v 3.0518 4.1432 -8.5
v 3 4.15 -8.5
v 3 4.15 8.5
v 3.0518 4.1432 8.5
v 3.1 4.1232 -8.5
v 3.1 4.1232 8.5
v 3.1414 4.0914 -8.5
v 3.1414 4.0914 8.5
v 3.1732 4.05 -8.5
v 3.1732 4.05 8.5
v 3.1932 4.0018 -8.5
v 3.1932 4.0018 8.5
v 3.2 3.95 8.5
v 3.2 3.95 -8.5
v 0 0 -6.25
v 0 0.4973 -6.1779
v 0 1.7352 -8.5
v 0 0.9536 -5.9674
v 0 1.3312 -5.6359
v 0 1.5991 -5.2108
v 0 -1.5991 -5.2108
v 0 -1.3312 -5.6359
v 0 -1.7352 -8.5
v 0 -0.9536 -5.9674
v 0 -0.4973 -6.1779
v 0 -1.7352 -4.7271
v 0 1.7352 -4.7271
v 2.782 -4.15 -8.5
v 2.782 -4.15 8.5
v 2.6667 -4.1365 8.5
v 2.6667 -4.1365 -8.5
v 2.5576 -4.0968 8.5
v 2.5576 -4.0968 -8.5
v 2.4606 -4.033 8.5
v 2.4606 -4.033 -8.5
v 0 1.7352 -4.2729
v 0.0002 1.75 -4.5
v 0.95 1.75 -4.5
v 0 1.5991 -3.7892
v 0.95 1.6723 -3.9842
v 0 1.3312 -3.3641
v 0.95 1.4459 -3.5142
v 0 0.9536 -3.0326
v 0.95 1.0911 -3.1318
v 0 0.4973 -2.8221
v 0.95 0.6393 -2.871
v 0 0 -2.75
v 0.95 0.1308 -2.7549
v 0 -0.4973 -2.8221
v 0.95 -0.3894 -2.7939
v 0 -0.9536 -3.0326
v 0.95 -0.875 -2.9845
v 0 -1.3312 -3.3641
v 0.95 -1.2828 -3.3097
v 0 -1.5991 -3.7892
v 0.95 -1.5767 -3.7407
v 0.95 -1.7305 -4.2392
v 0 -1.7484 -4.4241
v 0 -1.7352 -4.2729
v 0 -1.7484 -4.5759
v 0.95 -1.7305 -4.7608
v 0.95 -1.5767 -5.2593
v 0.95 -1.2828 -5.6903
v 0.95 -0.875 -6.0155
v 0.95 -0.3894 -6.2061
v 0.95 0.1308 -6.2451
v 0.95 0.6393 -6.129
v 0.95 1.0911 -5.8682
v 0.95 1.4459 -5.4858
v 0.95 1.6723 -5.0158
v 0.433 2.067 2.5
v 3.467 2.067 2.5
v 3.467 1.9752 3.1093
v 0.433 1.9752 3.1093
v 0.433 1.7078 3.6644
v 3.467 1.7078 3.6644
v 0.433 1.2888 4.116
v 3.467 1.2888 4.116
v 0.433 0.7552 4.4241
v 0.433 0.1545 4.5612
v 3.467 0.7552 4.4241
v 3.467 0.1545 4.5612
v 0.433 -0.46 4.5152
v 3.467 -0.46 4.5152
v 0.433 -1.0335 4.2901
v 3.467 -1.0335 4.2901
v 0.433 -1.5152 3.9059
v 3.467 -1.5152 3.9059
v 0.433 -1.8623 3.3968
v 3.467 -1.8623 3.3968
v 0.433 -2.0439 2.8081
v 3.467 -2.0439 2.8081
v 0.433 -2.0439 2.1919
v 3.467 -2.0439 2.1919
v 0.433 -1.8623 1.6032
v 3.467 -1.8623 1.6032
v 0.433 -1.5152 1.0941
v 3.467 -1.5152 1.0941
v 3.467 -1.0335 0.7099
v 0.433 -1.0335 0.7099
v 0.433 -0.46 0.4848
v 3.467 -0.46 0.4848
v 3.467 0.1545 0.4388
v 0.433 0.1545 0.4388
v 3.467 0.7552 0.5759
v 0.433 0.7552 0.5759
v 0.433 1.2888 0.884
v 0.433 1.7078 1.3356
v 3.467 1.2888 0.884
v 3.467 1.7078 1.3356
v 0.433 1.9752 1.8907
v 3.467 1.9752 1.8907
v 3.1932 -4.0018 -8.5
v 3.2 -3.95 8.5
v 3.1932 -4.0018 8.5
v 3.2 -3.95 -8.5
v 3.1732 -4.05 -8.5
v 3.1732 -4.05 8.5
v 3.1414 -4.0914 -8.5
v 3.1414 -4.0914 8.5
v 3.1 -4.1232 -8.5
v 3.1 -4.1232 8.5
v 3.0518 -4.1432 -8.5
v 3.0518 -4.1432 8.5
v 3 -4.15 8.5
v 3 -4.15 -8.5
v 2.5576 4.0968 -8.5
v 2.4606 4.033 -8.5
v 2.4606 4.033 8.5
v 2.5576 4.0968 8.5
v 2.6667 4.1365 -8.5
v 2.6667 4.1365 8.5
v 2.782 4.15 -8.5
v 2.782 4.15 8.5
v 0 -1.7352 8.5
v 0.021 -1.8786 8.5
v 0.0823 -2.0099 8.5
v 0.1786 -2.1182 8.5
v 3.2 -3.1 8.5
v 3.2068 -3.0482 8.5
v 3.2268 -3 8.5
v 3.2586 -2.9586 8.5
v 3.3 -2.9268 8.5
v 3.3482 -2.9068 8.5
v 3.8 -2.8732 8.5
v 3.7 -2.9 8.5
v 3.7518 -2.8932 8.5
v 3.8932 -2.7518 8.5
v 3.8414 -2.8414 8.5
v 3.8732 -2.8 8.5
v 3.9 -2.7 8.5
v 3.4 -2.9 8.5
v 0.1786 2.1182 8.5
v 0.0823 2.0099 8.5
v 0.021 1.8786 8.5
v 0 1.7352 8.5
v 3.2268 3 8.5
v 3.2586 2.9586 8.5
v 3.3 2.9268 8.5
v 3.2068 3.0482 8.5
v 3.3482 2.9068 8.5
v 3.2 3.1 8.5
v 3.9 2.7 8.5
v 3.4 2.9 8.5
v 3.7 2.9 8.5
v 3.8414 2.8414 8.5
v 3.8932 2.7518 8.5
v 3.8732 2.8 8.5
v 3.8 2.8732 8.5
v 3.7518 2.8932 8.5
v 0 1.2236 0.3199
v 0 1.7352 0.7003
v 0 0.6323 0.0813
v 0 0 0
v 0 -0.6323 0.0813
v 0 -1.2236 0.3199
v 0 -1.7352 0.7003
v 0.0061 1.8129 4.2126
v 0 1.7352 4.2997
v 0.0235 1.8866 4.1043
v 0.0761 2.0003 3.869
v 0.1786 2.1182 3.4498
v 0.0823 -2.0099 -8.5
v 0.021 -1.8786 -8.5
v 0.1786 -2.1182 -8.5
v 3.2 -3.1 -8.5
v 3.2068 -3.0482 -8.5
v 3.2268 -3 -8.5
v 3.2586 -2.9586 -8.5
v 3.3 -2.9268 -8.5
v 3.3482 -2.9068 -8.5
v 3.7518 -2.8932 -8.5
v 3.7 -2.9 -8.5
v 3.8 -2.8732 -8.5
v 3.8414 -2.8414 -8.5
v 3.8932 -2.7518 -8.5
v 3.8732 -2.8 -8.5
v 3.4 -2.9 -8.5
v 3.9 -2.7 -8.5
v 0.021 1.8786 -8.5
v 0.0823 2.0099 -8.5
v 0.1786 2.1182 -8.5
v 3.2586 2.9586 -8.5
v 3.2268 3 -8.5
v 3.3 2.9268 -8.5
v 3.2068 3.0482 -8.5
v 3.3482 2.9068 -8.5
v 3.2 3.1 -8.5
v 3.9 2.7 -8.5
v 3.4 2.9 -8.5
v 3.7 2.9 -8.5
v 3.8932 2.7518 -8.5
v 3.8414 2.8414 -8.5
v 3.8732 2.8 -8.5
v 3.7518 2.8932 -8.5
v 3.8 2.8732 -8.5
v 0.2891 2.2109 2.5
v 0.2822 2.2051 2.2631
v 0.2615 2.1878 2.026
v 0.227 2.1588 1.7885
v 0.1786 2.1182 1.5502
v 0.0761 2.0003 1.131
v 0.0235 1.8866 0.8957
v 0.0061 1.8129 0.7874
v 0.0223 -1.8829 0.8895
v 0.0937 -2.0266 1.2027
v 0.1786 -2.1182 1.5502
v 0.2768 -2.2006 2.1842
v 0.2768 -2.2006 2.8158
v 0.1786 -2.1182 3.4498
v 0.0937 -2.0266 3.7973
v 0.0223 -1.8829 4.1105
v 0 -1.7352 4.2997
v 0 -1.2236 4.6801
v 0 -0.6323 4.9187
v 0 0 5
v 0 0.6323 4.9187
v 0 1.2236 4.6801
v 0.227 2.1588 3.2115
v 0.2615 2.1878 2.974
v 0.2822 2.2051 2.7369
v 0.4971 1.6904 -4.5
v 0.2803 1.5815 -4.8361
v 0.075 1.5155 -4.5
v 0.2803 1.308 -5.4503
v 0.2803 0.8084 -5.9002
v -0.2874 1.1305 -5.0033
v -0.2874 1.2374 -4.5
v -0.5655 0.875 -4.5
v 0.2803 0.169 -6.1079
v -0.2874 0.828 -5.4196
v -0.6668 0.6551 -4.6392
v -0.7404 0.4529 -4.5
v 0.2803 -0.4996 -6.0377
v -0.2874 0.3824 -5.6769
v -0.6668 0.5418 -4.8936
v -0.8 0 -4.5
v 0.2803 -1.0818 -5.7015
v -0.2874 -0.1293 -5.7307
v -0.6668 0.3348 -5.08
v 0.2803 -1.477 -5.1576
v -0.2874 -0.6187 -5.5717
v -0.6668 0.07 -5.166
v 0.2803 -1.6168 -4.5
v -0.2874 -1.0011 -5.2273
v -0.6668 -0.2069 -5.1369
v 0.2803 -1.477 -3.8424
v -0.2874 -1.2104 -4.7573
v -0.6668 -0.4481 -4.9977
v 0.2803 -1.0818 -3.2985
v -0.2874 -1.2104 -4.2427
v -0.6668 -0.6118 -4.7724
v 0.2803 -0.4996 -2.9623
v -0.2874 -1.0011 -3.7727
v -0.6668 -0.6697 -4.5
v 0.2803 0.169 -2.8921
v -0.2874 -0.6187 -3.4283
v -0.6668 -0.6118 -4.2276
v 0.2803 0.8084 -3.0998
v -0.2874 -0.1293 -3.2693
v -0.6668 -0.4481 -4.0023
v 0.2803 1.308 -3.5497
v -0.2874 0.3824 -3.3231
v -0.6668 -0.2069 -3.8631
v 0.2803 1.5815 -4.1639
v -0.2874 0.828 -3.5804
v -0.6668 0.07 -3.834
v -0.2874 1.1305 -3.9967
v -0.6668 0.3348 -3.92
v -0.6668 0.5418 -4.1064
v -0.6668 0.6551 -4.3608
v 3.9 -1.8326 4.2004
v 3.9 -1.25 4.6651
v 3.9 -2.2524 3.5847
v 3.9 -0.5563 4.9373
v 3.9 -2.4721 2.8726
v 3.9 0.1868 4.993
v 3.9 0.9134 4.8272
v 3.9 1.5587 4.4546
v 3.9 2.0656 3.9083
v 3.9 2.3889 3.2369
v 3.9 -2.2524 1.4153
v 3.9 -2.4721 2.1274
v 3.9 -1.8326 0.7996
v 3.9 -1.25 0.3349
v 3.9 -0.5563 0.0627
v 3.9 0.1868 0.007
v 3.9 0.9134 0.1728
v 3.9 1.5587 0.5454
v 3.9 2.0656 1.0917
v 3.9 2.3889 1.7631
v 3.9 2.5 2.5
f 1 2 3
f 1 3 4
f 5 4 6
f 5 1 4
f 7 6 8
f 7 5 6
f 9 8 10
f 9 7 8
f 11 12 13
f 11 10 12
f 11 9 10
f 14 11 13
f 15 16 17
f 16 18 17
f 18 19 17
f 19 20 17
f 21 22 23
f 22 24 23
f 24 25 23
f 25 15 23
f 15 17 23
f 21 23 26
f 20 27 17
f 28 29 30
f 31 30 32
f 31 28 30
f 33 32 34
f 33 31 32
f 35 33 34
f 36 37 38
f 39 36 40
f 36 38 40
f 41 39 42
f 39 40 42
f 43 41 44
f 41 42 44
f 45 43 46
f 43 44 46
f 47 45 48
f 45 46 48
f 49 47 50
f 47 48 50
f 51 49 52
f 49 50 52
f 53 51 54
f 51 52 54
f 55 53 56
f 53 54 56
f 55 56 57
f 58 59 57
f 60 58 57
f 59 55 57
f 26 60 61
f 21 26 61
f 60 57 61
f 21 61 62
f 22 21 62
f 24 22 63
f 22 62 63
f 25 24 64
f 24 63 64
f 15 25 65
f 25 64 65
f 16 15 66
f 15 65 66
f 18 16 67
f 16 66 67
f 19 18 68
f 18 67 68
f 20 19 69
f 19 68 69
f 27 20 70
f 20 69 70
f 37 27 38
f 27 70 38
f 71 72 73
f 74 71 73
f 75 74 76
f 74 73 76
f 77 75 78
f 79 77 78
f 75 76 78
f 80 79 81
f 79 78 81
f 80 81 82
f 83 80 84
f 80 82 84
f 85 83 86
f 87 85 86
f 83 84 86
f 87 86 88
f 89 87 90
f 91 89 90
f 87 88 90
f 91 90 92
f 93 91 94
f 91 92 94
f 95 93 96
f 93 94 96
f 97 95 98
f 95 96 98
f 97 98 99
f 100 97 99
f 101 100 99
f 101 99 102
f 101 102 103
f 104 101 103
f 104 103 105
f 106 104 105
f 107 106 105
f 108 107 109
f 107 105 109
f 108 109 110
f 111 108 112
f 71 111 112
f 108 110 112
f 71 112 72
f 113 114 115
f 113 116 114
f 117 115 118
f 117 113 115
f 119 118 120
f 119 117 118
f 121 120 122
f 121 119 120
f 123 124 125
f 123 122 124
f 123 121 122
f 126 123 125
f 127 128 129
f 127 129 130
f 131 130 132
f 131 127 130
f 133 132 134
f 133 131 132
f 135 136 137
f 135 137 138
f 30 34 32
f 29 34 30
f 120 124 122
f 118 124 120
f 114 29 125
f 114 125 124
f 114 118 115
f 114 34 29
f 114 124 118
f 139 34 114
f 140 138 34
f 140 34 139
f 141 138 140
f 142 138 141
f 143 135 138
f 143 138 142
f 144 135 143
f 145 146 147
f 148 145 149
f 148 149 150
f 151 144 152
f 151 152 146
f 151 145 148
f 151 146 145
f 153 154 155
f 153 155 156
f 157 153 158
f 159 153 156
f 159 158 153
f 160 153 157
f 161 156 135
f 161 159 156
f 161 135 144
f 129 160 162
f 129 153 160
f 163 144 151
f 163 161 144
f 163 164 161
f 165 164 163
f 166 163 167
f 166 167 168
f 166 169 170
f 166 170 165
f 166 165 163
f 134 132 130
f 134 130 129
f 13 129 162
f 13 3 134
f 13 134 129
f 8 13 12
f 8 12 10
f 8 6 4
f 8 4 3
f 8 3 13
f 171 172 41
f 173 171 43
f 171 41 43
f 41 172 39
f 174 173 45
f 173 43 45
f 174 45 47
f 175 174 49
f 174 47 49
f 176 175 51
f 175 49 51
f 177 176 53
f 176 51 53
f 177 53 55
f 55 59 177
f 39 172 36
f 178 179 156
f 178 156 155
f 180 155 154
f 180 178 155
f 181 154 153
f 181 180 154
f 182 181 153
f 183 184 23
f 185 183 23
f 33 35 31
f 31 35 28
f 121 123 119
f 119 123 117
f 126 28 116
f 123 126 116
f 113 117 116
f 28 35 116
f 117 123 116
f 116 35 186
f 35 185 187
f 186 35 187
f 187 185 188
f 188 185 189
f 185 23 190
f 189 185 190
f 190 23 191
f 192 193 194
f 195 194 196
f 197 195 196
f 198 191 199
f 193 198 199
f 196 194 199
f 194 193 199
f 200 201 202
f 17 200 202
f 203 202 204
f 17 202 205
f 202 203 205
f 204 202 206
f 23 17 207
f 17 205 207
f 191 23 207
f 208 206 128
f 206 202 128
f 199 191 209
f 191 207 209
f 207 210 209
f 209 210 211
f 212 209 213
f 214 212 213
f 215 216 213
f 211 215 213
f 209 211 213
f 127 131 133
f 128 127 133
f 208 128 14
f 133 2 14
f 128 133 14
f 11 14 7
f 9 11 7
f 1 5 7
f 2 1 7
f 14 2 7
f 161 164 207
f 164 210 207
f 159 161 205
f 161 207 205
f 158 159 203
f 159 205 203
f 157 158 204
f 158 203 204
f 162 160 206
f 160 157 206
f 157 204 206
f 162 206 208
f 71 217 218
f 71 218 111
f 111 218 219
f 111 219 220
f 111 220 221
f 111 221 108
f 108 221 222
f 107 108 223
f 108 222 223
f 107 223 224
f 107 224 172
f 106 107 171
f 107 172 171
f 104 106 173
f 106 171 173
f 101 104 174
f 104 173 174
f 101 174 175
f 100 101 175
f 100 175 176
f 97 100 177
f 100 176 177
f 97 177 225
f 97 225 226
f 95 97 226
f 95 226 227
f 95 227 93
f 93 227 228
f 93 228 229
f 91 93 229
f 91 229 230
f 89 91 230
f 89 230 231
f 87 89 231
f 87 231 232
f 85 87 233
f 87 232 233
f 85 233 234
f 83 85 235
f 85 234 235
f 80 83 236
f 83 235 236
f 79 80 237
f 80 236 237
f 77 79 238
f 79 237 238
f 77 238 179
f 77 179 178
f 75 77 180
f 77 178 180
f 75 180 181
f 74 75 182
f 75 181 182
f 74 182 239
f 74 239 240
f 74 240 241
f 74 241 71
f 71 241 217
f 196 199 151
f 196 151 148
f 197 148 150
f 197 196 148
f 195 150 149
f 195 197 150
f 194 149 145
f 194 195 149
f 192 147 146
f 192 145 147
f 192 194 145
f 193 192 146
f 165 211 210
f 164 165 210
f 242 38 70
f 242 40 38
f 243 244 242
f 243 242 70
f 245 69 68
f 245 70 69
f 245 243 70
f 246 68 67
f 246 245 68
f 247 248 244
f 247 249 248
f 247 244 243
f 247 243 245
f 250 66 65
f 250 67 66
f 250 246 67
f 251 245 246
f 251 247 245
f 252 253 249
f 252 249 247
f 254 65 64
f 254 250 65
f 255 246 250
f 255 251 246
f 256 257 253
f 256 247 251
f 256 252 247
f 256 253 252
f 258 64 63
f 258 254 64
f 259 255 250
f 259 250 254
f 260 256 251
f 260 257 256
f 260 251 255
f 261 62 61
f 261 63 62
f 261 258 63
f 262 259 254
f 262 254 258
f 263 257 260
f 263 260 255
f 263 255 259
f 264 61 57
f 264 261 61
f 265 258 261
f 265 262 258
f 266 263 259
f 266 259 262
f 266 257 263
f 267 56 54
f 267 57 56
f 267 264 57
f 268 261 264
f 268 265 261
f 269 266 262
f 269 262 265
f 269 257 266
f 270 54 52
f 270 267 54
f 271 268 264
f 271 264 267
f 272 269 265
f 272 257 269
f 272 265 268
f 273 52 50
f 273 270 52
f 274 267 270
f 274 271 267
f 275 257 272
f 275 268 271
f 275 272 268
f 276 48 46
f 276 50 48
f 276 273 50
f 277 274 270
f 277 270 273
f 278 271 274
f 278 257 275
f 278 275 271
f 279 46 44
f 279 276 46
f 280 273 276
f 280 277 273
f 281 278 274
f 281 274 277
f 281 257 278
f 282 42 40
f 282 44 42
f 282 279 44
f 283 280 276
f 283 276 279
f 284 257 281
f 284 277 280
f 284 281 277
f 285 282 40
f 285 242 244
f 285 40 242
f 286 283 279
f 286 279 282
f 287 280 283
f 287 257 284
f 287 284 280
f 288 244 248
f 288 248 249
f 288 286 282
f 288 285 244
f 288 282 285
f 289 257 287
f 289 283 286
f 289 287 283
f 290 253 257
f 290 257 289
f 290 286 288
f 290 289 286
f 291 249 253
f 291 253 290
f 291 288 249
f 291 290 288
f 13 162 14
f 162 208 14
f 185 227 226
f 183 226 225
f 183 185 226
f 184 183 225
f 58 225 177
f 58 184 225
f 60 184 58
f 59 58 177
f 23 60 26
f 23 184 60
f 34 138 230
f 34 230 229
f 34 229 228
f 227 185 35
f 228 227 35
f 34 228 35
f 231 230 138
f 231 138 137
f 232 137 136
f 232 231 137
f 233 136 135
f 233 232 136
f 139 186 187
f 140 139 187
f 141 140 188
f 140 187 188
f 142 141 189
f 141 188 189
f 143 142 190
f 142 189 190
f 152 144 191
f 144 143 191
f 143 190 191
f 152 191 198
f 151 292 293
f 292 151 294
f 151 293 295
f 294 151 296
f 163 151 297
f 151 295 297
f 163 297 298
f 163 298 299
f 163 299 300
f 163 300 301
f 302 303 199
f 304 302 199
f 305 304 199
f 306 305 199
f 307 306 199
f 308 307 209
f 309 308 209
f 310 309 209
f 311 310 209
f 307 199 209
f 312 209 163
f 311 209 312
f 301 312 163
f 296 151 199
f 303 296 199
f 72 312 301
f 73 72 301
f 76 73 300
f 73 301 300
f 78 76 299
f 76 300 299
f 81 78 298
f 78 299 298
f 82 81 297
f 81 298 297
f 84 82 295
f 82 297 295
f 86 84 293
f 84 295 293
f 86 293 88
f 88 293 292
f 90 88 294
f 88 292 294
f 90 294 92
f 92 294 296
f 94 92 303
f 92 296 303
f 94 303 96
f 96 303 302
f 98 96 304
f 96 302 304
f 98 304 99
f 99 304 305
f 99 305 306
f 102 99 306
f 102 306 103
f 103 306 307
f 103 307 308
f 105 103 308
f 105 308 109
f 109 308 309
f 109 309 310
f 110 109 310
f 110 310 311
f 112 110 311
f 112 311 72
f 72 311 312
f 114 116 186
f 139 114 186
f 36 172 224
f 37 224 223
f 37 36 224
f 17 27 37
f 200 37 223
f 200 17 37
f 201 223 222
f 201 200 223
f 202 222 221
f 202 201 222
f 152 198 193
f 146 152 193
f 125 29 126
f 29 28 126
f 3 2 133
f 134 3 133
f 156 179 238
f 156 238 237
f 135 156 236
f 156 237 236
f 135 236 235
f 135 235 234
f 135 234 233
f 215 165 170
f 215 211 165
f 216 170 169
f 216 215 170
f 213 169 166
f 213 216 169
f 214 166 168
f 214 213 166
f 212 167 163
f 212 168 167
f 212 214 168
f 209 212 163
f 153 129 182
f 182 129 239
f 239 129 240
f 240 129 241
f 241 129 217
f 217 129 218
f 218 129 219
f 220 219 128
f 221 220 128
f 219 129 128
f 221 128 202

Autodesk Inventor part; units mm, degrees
sketch "_____2" plane through (0, 0, 0) normal (0, 0, 1) x (1, 0, 0)
  arc A0 (0, -1.7352) -> (0.1786, -2.1182) centre (0.5, -1.7352) ccw
  line L0 (0.1786, -2.1182) -> (2.4606, -4.033)
  arc A1 (2.4606, -4.033) -> (2.782, -4.15) centre (2.782, -3.65) ccw
  line L1 (2.782, -4.15) -> (3, -4.15)
  arc A2 (3, -4.15) -> (3.2, -3.95) centre (3, -3.95) ccw
  line L2 (3.2, -3.95) -> (3.2, -3.1)
  arc A3 (3.4, -2.9) -> (3.2, -3.1) centre (3.4, -3.1) ccw
  line L3 (3.4, -2.9) -> (3.7, -2.9)
  arc A4 (3.7, -2.9) -> (3.9, -2.7) centre (3.7, -2.7) ccw
  line L4 (3.9, -2.7) -> (3.9, 2.7)
  arc A5 (3.9, 2.7) -> (3.7, 2.9) centre (3.7, 2.7) ccw
  line L5 (3.7, 2.9) -> (3.4, 2.9)
  arc A6 (3.2, 3.1) -> (3.4, 2.9) centre (3.4, 3.1) ccw
  line L6 (3.2, 3.1) -> (3.2, 3.95)
  arc A7 (3.2, 3.95) -> (3, 4.15) centre (3, 3.95) ccw
  line L7 (3, 4.15) -> (2.782, 4.15)
  arc A8 (2.782, 4.15) -> (2.4606, 4.033) centre (2.782, 3.65) ccw
  line L8 (2.4606, 4.033) -> (0.1786, 2.1182)
  arc A9 (0.1786, 2.1182) -> (0, 1.7352) centre (0.5, 1.7352) ccw
  line L9 (0, 1.7352) -> (0, -1.7352)
extrude "Extrusion1" add sketch "_____2" along normal mid plane 17
sketch "Sketch_2" plane through (0, 0, 2.5) normal (0, 0, 1) x (1, 0, 0)
  line L0 (3.9, 0) -> (0, 0)
  line L1 (0, 0) -> (0, 2.5)
  line L2 (0, 2.5) -> (0.433, 2.067)
  line L3 (0.433, 2.067) -> (3.467, 2.067)
  line L4 (3.467, 2.067) -> (3.9, 2.5)
  line L5 (3.9, 2.5) -> (3.9, 0)
  line L6 (3.9, 0) -> (0, 0)
revolve "Revolution1" cut sketch "Sketch_2" angle 360 about axis through (3.9, 0, 2.5) along (1, 0, 0)
thread "Thread1" size "M5x0.8" class "6H" standard "ISO Metric profile" full length
sketch "_____1" plane through (0, 0, -4.5) normal (0, 0, 1) x (1, 0, 0)
  line L0 (0.95, 0) -> (0, 0)
  line L1 (0, 0) -> (0, 1.75)
  line L2 (0, 1.75) -> (0.95, 1.75)
  line L3 (0.95, 1.75) -> (0.95, 0)
  line L4 (0.95, 0) -> (0, 0)
revolve "Revolution2" cut sketch "_____1" angle 360 about axis through (0.95, 0, -4.5) along (1, 0, 0)
sketch "Sketch_3" plane through (0, 0, -4.5) normal (0, 0, 1) x (1, 0, 0)
  line L0 (2.7, 0) -> (-0.8, 0)
  arc A0 (2.7, 0) -> (-0.8, 0) centre (0.95, 0) ccw
  line L1 (2.7, 0) -> (-0.8, 0)
revolve "Revolution3" add sketch "Sketch_3" angle 360 about axis through (2.7, 0, -4.5) along (1, 0, 0)
ref_plane "to_blackets_XY" through (3.9, 0, 2.5) normal (1, 0, 0) x (0, 0, -1)
ref_plane "to_blackets_YZ" through (3.9, 0, 2.5) normal (0, 0, -1) x (0, 1, 0)
ref_plane "to_blackets_ZX" through (3.9, 0, 2.5) normal (0, 1, 0) x (1, 0, 0)
ref_plane "to_bolt_XY" through (0, 0, 2.5) normal (1, 0, 0) x (0, 0, -1)
ref_plane "to_bolt_YZ" through (0, 0, 2.5) normal (0, 0, -1) x (0, 1, 0)
ref_plane "to_bolt_ZX" through (0, 0, 2.5) normal (0, 1, 0) x (1, 0, 0)
ref_plane "to_frames_XY" through (3.2, 0, 2.5) normal (1, 0, 0) x (0, 0, -1)
ref_plane "to_frames_YZ" through (3.2, 0, 2.5) normal (0, 0, -1) x (0, 1, 0)
ref_plane "to_frames_ZX" through (3.2, 0, 2.5) normal (0, 1, 0) x (1, 0, 0)
properties part number "HNTP5-5"
